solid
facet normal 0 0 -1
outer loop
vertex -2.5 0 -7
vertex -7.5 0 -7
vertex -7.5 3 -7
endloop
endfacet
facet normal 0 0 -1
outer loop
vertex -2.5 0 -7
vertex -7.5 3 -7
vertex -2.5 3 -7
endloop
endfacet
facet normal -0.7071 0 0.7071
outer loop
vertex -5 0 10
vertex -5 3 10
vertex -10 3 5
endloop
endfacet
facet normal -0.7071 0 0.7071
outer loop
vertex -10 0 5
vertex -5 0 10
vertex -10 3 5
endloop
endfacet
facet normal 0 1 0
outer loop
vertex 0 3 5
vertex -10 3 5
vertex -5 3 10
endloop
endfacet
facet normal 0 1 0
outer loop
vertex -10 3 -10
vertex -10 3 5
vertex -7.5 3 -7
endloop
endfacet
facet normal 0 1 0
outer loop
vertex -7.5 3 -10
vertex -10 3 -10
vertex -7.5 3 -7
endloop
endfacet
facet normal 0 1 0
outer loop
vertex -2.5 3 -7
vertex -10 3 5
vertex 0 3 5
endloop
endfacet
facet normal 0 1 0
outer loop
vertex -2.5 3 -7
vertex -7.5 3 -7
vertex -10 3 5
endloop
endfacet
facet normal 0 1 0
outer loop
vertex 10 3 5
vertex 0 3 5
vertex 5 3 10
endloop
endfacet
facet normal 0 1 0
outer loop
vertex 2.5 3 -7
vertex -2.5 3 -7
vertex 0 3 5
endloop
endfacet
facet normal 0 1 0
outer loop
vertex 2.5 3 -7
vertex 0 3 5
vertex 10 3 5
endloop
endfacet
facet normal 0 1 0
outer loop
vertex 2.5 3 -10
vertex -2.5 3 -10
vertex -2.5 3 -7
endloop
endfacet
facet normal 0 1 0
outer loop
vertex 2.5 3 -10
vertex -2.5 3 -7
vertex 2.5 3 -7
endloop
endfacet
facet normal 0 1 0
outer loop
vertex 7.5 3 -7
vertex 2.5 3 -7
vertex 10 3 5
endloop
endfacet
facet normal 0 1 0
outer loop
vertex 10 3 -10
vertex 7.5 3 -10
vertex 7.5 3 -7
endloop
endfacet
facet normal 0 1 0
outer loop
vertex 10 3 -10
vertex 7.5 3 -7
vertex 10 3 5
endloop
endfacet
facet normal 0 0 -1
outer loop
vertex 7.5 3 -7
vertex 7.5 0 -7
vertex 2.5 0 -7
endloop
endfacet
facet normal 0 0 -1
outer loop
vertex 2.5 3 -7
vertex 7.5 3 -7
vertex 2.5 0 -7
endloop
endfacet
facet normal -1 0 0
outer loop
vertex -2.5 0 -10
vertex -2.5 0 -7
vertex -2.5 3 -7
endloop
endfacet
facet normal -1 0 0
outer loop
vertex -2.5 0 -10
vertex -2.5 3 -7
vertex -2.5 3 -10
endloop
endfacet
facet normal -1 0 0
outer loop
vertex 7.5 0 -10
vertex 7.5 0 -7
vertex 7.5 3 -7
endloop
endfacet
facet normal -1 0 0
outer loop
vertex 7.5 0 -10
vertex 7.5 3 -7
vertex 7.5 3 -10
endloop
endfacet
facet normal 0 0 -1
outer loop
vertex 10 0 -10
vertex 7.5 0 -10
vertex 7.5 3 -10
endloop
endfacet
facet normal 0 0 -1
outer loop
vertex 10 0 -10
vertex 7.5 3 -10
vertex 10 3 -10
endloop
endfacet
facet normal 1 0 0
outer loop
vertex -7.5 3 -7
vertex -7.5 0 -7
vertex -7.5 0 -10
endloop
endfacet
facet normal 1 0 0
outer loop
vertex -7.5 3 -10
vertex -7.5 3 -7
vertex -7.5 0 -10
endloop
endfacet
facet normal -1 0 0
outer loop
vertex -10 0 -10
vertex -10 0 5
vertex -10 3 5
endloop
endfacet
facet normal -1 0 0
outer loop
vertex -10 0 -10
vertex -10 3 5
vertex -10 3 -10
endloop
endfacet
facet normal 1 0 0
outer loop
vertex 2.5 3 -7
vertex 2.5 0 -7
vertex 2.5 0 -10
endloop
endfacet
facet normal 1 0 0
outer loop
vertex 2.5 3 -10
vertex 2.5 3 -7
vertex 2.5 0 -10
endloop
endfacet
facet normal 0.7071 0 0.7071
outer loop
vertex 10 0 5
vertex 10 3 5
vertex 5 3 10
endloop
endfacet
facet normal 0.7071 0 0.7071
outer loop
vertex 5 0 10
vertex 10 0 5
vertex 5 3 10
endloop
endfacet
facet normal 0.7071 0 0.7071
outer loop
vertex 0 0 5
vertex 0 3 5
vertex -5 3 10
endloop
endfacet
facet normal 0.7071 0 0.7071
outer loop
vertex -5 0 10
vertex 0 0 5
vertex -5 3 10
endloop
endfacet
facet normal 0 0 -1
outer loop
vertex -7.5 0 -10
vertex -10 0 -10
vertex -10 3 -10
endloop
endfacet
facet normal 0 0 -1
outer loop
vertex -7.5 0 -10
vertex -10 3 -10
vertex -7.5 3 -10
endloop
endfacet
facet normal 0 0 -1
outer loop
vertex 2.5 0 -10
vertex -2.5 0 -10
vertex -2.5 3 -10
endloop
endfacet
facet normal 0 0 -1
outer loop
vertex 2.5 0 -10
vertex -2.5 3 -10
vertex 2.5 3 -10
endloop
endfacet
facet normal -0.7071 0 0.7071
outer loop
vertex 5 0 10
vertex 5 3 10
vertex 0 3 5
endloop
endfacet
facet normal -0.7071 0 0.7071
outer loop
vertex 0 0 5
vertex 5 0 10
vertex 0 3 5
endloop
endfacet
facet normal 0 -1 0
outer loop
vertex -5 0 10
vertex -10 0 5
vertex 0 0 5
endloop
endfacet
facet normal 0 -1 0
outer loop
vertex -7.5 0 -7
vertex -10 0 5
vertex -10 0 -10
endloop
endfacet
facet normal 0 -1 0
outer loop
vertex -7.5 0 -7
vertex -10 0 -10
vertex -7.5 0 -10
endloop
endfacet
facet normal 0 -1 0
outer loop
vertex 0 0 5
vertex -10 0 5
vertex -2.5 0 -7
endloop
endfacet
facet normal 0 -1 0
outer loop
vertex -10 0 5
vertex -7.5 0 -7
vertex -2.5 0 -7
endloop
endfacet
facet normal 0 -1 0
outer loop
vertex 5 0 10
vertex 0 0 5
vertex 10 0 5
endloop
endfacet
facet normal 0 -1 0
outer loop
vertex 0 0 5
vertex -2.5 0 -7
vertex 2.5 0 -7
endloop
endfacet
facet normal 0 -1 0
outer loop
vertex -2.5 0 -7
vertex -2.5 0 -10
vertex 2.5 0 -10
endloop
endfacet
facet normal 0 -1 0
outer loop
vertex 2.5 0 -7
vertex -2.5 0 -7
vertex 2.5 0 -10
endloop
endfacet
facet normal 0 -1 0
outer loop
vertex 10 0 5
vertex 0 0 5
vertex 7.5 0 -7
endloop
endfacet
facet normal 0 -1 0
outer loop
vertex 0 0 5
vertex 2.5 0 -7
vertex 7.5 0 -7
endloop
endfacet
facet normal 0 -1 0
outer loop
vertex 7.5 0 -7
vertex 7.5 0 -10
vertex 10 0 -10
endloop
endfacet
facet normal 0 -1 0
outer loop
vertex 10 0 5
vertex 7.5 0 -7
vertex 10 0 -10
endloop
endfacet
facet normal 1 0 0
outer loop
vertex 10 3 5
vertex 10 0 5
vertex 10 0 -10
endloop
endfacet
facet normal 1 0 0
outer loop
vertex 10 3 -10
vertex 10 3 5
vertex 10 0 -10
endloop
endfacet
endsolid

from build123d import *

# Parameters (mm, degrees)
SKETCH1_W               = 20
SKETCH1_H               = 20
BOSS_EXTRUDE1_DEPTH     = 3
CUT_EXTRUDE1_DEPTH      = 1
CUT_EXTRUDE1_DEPTH_BACK = 4
CUT_EXTRUDE2_START      = -4
SKETCH3_W               = 5
SKETCH3_H               = 3
CUT_EXTRUDE2_DEPTH      = 5


with BuildPart() as part:
    # Sketch1 → Boss-Extrude1 (new body)
    with BuildSketch(Plane(origin=(0, 0, 0), x_dir=(1, 0, 0), z_dir=(0, 1, 0))):
        Rectangle(SKETCH1_W, SKETCH1_H)
    extrude(amount=BOSS_EXTRUDE1_DEPTH)

    # Sketch2 → Cut-Extrude1 (cut, two sides)
    with BuildSketch(Plane(origin=(0, 3, 0), x_dir=(1, 0, 0), z_dir=(0, 1, 0))) as cut_extrude1_sk:
        Polygon((-5, -10), (-10, -5), (-10, -10), align=None)
        Polygon((0, -5), (-5, -10), (5, -10), align=None)
        Polygon((10, -5), (5, -10), (10, -10), align=None)
    extrude(amount=CUT_EXTRUDE1_DEPTH, mode=Mode.SUBTRACT)
    extrude(cut_extrude1_sk.sketch, amount=-CUT_EXTRUDE1_DEPTH_BACK, mode=Mode.SUBTRACT)

    # Sketch3 → Cut-Extrude2 (cut)
    with BuildSketch(Plane(origin=(0, 3, 0), x_dir=(1, 0, 0), z_dir=(0, 1, 0)).offset(CUT_EXTRUDE2_START)):
        with Locations((-5, 8.5)):
            Rectangle(SKETCH3_W, SKETCH3_H)
    cut_extrude2 = extrude(amount=CUT_EXTRUDE2_DEPTH, mode=Mode.SUBTRACT)

    # Mirror1: Cut-Extrude2 across plane
    add(cut_extrude2.mirror(Plane(origin=(0, 0, 0), x_dir=(0, 0, 1), z_dir=(1, 0, 0))), mode=Mode.SUBTRACT)


solid = part.part
